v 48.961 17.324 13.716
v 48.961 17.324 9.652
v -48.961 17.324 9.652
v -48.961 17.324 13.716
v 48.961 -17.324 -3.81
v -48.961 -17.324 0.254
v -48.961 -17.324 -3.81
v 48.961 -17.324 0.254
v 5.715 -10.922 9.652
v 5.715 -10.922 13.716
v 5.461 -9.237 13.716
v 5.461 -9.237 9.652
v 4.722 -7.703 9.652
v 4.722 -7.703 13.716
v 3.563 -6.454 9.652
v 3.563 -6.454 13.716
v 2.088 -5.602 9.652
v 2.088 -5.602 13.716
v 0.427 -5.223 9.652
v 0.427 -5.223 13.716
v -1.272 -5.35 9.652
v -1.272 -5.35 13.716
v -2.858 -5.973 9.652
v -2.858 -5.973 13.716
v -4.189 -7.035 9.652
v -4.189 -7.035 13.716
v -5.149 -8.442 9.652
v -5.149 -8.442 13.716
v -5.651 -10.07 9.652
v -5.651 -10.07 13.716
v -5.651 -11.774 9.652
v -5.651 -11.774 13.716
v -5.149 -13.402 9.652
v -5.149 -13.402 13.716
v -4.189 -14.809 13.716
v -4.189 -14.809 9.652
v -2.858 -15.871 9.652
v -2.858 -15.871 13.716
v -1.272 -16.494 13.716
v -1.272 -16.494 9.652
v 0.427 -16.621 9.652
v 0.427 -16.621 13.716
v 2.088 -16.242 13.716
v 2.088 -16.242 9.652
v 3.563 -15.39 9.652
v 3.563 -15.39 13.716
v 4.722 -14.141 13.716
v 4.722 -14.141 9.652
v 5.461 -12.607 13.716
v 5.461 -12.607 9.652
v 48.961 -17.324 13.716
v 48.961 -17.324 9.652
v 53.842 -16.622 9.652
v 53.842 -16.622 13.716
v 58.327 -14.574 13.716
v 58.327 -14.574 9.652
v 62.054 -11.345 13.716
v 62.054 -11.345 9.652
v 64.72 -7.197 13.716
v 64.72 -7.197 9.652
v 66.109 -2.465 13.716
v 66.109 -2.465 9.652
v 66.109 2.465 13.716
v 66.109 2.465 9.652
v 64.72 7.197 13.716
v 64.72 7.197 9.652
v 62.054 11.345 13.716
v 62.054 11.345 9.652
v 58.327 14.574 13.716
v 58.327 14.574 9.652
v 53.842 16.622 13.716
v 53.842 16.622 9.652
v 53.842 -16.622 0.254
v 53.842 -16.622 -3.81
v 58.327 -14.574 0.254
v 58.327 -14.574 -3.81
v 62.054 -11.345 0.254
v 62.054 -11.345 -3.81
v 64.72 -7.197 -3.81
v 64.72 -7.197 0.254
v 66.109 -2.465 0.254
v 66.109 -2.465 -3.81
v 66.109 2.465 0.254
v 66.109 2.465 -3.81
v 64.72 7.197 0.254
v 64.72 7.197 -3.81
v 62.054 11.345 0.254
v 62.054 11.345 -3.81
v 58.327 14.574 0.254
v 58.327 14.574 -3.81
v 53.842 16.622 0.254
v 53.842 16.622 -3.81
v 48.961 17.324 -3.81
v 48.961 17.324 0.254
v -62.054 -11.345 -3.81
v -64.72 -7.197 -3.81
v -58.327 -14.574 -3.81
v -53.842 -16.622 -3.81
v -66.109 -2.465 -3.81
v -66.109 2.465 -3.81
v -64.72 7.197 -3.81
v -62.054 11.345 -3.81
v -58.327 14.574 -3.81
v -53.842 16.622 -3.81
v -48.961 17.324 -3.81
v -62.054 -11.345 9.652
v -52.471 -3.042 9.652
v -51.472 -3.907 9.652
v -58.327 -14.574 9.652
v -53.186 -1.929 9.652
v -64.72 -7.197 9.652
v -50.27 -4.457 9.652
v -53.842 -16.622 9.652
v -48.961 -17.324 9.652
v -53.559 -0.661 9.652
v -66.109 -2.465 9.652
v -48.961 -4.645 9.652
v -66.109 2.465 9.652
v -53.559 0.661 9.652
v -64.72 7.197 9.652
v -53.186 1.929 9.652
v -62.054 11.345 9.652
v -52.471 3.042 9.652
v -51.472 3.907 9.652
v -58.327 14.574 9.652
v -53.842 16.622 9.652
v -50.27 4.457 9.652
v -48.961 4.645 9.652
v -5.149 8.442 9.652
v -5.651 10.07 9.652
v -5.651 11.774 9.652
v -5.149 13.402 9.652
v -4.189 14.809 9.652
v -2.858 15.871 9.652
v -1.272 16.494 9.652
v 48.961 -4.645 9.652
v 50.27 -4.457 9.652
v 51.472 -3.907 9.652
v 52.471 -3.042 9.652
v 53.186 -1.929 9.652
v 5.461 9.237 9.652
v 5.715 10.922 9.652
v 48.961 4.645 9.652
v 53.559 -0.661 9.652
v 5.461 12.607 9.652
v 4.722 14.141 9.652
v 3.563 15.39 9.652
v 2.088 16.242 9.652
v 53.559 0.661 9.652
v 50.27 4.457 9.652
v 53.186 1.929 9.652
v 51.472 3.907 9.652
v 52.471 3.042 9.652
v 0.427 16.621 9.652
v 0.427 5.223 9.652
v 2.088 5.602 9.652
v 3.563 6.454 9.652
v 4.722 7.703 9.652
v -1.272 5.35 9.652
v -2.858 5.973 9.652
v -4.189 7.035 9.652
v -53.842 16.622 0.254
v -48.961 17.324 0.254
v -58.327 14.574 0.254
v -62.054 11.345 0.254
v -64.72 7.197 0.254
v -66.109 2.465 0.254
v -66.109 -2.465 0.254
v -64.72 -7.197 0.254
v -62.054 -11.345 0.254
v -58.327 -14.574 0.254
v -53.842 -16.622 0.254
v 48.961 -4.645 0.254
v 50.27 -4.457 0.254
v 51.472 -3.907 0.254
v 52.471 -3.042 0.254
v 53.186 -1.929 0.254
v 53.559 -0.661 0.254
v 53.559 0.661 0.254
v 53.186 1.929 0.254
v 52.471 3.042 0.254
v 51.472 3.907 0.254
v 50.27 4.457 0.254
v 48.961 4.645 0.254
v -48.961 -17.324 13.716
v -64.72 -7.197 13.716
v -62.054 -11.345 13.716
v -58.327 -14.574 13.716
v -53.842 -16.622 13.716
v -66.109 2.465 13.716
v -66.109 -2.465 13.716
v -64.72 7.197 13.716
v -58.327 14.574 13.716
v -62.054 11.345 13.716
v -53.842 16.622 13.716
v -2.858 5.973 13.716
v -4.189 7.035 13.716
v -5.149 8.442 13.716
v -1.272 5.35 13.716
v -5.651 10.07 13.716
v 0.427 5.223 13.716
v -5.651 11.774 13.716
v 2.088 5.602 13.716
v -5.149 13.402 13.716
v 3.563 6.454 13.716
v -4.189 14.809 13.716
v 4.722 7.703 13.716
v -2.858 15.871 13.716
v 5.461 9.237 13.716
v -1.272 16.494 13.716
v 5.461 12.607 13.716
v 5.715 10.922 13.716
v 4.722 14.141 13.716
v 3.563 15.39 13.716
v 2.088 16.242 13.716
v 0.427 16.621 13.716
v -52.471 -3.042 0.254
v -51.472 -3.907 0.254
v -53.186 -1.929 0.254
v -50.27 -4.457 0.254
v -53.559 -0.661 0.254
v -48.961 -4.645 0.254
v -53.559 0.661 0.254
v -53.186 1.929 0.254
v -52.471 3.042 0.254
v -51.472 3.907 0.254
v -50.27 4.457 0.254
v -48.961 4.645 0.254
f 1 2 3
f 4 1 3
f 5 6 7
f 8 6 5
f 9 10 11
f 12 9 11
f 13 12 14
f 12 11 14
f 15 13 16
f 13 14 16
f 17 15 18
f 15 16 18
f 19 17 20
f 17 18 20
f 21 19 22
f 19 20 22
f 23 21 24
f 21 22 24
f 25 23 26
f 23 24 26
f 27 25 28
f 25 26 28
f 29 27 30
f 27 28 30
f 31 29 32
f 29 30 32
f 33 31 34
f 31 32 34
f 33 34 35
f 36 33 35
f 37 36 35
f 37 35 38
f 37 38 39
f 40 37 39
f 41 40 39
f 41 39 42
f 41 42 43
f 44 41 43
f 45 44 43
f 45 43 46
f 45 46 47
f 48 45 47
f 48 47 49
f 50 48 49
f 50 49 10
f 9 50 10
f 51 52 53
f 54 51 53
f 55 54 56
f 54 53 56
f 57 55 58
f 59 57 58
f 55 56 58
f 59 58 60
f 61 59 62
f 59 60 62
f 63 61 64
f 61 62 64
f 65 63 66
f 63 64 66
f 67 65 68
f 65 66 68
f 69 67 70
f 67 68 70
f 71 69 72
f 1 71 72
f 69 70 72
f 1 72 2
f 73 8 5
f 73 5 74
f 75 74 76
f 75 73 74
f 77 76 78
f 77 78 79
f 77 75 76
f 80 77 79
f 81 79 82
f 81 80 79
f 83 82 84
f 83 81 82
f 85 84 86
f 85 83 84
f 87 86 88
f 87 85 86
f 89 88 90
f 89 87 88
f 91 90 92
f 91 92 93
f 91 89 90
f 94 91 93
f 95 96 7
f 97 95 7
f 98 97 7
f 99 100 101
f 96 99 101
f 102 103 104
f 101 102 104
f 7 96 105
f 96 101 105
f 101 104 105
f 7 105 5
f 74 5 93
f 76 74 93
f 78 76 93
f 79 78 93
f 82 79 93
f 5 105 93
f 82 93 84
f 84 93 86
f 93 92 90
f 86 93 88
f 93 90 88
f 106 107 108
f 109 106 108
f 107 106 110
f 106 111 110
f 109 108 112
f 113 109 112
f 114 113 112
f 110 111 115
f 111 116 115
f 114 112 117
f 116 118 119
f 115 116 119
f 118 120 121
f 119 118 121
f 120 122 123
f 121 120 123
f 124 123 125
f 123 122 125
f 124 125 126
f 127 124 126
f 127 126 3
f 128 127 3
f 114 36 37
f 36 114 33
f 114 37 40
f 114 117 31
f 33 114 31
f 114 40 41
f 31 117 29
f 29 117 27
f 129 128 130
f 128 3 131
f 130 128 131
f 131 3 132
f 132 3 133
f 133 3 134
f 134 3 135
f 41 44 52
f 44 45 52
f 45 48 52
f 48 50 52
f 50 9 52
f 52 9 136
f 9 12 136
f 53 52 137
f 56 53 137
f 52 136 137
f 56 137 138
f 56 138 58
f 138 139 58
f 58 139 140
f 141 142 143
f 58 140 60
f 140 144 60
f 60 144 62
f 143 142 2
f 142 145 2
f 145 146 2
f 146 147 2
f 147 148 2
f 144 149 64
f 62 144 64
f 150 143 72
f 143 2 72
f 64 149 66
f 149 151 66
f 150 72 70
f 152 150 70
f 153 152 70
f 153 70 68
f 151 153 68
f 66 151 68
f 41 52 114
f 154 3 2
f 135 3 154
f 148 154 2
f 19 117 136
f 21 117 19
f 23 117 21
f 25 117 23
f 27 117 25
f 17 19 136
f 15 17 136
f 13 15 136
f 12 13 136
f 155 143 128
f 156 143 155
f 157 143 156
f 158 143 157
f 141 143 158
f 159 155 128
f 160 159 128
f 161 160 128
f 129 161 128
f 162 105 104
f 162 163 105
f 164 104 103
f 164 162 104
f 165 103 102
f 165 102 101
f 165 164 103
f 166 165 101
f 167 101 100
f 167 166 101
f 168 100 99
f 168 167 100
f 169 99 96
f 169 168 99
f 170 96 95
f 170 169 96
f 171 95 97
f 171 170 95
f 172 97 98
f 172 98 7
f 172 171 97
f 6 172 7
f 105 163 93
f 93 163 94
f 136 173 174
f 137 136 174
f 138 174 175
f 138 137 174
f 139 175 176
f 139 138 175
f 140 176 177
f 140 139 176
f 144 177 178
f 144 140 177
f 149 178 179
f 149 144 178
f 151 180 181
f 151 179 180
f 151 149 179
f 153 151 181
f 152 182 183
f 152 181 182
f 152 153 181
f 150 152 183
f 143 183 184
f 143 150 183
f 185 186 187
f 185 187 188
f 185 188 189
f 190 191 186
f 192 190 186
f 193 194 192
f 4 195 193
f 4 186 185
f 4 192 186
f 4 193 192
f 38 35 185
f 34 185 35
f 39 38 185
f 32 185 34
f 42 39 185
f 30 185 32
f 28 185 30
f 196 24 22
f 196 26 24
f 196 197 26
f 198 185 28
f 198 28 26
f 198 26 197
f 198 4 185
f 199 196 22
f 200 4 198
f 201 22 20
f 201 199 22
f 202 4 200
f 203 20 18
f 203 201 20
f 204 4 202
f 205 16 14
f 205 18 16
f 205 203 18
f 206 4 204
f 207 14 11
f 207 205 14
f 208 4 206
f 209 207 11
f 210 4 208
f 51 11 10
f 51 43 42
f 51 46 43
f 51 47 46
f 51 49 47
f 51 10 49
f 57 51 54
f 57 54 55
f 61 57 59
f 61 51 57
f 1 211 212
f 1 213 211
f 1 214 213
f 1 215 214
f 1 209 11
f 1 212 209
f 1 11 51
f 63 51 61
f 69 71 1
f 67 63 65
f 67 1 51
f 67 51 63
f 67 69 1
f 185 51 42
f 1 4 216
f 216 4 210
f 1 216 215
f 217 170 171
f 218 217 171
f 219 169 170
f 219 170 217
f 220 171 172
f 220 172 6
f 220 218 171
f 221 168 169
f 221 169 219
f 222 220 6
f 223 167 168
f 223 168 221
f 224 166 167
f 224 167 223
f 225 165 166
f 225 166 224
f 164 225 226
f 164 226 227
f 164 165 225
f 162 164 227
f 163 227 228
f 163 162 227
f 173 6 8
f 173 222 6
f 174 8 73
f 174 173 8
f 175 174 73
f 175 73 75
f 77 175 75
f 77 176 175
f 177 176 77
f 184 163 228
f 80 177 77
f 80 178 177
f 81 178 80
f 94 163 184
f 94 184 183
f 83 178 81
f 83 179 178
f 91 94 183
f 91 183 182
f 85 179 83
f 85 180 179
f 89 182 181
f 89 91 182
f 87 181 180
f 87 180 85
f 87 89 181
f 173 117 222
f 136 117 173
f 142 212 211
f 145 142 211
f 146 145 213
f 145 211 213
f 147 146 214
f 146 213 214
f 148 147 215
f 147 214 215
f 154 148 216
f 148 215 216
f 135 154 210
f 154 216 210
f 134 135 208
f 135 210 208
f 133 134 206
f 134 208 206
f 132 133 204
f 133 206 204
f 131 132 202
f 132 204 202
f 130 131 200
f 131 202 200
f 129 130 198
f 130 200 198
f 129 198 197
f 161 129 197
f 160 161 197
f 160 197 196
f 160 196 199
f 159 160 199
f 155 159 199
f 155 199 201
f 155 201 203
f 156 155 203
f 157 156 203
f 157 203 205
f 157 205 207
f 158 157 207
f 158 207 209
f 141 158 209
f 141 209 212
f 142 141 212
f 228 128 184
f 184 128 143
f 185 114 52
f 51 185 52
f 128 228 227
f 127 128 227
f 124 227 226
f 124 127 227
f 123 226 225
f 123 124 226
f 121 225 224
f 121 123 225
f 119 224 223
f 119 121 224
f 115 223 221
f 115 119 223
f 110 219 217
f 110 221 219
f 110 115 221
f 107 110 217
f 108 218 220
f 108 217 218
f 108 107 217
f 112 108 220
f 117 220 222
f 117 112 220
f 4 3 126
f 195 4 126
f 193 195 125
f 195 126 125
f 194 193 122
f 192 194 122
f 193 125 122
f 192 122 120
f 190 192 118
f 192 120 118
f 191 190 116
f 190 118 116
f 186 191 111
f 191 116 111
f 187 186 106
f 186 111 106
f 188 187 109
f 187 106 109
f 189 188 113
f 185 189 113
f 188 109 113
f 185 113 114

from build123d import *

# Parameters (mm, degrees)
F0_W          = 97.9224070907
F0_H          = 9.2892860994
F1_DEPTH      = 13.716
F1_DEPTH_BACK = 3.81
F0_H_2        = 12.6795382239
F2_DEPTH      = 0.254
F2_DEPTH_BACK = 3.81
F3_START      = 9.398
F3_DEPTH      = 4.064
F4_R          = 5.715
F5_DEPTH      = 4.572


with BuildPart() as f1:
    # F0 (on Top) → F1 (new body, two sides)
    with BuildSketch(Plane.XY) as f1_sk:
        Rectangle(F0_W, F0_H)
        with BuildLine():
            ThreePointArc((48.9612035453, -4.6446430497), (53.605846595, 0), (48.9612035453, 4.6446430497))
            Line((48.9612035453, 4.6446430497), (48.9612035453, -4.6446430497))
        make_face()
        with BuildLine():
            Line((-48.9612035453, -4.6446430497), (-48.9612035453, 4.6446430497))
            ThreePointArc((-48.9612035453, 4.6446430497), (-53.605846595, 0), (-48.9612035453, -4.6446430497))
        make_face()
    extrude(amount=F1_DEPTH)
    extrude(f1_sk.sketch, amount=-F1_DEPTH_BACK)

    # F0 (on Top) → F2 (join, two sides)
    with BuildSketch(Plane.XY) as f2_sk:
        with Locations((0, -10.9844121616)):
            Rectangle(F0_W, F0_H_2)
        with BuildLine():
            Line((-48.9612035453, 4.6446430497), (-48.9612035453, 17.3241812736))
            ThreePointArc((-48.9612035453, 17.3241812736), (-66.2853848189, 0), (-48.9612035453, -17.3241812736))
            Line((-48.9612035453, -17.3241812736), (-48.9612035453, -4.6446430497))
            ThreePointArc((-48.9612035453, -4.6446430497), (-53.605846595, 0), (-48.9612035453, 4.6446430497))
        make_face()
        with Locations((0, 10.9844121616)):
            Rectangle(F0_W, F0_H_2)
        with BuildLine():
            ThreePointArc((48.9612035453, -17.3241812736), (66.2853848189, 0), (48.9612035453, 17.3241812736))
            Line((48.9612035453, 17.3241812736), (48.9612035453, 4.6446430497))
            ThreePointArc((48.9612035453, 4.6446430497), (53.605846595, 0), (48.9612035453, -4.6446430497))
            Line((48.9612035453, -4.6446430497), (48.9612035453, -17.3241812736))
        make_face()
    extrude(amount=F2_DEPTH)
    extrude(f2_sk.sketch, amount=-F2_DEPTH_BACK)

    # F2_face (on face) → F3 (join)
    with BuildSketch(Plane.XY.offset(0.254).offset(F3_START)):
        with BuildLine():
            Line((-48.9612035453, -17.3241812736), (48.9612035453, -17.3241812736))
            ThreePointArc((48.9612035453, -17.3241812736), (66.2853848189, 0), (48.9612035453, 17.3241812736))
            Line((48.9612035453, 17.3241812736), (-48.9612035453, 17.3241812736))
            ThreePointArc((-48.9612035453, 17.3241812736), (-66.2853848189, 0), (-48.9612035453, -17.3241812736))
        make_face()
        with BuildLine():
            Line((48.9612035453, -4.6446430497), (-48.9612035453, -4.6446430497))
            ThreePointArc((-48.9612035453, -4.6446430497), (-53.605846595, 0), (-48.9612035453, 4.6446430497))
            Line((-48.9612035453, 4.6446430497), (48.9612035453, 4.6446430497))
            ThreePointArc((48.9612035453, 4.6446430497), (53.605846595, 0), (48.9612035453, -4.6446430497))
        make_face(mode=Mode.SUBTRACT)
    extrude(amount=F3_DEPTH)

    # F4 (on face) → F5 (cut)
    with BuildSketch(Plane.XY.offset(13.716)):
        with Locations((0, 10.922)):
            Circle(F4_R)
        with Locations((0, -10.922)):
            Circle(F4_R)
    extrude(amount=-F5_DEPTH, mode=Mode.SUBTRACT)


solid = f1.part
